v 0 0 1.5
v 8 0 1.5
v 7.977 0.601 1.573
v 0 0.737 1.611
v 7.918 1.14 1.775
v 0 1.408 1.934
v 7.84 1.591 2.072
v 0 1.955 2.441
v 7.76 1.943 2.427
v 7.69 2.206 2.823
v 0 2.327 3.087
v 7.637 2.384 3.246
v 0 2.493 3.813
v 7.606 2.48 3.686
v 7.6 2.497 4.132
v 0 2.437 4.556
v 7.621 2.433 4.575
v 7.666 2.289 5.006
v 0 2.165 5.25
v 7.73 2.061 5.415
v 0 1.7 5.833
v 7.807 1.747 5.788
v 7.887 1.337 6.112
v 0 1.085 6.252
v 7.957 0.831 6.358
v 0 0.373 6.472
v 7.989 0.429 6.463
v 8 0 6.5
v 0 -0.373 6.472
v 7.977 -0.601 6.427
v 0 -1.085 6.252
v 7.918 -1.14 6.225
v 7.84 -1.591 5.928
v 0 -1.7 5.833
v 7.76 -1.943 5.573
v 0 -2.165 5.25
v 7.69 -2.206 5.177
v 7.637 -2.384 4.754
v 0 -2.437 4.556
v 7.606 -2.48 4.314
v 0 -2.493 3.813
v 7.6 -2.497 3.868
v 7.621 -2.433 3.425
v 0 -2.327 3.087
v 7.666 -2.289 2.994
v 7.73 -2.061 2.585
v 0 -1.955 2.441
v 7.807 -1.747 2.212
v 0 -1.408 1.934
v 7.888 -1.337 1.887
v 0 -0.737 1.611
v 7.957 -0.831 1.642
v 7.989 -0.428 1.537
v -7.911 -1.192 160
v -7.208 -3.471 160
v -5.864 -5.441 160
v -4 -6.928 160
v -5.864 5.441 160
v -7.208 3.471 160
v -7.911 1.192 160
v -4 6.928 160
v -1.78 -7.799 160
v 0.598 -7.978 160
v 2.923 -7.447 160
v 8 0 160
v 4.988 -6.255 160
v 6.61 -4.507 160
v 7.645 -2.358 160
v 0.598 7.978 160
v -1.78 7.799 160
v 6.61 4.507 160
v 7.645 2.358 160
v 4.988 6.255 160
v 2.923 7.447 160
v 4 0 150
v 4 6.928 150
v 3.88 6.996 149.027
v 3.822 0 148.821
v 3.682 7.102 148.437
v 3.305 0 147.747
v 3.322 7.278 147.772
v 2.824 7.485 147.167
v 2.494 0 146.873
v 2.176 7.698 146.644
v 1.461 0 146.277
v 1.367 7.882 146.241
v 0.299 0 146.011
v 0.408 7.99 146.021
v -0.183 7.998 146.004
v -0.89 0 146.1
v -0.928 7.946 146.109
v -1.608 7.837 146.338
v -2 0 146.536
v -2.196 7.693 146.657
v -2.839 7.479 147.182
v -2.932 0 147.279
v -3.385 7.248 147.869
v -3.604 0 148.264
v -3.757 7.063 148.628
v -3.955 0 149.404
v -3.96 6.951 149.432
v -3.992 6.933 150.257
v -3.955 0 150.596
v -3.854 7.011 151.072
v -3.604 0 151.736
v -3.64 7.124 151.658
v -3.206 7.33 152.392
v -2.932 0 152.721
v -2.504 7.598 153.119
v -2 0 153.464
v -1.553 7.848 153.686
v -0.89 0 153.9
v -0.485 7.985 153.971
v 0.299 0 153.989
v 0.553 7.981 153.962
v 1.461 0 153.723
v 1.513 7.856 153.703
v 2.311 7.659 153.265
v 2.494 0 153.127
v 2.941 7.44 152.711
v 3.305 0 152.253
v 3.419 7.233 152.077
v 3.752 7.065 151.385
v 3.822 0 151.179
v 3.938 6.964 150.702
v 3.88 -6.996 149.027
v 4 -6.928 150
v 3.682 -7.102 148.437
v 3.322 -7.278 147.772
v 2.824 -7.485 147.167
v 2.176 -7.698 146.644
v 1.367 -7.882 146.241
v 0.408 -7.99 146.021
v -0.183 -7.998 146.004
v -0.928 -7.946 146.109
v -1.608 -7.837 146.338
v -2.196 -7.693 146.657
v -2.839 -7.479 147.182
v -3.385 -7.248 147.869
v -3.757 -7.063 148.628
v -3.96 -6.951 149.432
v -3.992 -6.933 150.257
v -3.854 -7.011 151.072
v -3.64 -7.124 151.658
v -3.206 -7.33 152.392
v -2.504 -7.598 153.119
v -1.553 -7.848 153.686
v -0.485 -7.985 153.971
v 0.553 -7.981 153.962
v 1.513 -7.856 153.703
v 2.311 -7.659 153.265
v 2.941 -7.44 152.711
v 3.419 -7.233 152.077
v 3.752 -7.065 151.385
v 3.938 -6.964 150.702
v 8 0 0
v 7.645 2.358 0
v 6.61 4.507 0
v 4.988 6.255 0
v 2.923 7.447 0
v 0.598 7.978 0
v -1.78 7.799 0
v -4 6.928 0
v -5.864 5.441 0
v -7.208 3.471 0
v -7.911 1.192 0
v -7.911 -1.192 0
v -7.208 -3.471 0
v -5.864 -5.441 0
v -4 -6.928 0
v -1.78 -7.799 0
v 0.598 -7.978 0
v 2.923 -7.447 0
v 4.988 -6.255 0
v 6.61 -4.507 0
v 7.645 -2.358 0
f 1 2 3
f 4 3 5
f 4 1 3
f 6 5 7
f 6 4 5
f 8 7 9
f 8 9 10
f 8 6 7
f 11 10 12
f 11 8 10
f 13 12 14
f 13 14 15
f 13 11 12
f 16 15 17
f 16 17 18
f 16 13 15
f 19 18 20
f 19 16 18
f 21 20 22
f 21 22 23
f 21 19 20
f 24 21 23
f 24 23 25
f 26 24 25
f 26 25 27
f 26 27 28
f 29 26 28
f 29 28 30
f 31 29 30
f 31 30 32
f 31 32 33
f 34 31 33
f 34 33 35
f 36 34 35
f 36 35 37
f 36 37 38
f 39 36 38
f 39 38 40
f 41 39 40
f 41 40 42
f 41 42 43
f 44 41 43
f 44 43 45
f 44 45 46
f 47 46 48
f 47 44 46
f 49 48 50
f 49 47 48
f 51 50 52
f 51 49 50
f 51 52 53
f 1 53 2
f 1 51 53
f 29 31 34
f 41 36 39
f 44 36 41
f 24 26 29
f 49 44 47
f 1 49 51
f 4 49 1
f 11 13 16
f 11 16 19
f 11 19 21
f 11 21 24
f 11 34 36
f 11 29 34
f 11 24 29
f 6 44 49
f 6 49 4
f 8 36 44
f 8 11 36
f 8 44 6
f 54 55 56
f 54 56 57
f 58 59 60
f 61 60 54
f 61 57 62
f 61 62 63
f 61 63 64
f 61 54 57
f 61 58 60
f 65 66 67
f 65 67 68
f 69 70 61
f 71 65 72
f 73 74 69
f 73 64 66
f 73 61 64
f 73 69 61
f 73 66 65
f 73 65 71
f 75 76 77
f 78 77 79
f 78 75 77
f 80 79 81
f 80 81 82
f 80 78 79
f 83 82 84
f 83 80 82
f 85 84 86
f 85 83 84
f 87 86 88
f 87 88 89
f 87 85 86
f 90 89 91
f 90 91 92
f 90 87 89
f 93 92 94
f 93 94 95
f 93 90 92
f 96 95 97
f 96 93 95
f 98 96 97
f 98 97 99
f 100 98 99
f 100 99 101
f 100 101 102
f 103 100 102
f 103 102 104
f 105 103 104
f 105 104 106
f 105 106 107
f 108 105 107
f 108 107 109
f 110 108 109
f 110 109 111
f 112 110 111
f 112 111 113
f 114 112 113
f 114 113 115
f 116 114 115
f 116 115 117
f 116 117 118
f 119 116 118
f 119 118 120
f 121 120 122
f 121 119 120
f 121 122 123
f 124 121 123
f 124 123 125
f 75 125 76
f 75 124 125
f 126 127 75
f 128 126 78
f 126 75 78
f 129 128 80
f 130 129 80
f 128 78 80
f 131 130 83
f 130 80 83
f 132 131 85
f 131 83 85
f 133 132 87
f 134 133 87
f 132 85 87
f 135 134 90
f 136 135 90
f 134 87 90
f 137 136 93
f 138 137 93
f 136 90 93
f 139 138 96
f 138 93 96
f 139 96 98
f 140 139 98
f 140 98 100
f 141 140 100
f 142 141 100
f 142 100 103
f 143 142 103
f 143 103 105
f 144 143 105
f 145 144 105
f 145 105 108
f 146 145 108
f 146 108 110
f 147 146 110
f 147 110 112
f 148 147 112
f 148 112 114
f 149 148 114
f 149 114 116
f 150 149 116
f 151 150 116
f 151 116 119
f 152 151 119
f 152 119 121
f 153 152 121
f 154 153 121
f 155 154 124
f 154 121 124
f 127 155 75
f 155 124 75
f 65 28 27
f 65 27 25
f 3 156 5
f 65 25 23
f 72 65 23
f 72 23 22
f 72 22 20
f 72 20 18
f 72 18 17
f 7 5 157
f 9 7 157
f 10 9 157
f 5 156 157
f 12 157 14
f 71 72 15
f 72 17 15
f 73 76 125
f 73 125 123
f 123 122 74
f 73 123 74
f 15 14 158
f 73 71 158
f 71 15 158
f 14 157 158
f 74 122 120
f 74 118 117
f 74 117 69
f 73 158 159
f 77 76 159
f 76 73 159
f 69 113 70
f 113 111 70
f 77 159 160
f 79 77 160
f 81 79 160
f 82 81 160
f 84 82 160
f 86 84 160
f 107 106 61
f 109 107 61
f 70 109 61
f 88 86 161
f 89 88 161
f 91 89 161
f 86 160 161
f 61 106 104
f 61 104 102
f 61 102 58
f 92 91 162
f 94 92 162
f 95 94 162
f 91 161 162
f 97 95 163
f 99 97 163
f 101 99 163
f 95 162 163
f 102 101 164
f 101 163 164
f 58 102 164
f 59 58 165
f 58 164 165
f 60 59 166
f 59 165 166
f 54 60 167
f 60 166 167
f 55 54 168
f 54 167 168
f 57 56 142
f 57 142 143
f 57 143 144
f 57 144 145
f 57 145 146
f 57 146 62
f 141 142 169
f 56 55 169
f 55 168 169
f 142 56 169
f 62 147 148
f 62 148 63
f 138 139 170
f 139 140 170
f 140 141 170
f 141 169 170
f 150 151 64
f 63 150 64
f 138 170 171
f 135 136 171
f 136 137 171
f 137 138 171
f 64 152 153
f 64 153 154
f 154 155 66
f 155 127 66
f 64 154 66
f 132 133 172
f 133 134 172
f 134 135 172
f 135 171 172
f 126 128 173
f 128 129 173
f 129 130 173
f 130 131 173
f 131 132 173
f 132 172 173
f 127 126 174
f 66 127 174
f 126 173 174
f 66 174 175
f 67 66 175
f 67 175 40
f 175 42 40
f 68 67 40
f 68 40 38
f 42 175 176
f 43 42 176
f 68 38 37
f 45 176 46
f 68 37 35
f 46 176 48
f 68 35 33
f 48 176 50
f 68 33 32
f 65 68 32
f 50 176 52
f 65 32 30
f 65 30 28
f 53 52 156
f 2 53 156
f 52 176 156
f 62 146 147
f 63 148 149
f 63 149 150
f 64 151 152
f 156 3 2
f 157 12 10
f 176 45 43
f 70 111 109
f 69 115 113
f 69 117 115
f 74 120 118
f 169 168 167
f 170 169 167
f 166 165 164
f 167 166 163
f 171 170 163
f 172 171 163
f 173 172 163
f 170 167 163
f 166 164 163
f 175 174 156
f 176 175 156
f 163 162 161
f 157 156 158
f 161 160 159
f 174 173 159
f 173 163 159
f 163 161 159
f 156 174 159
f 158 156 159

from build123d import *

# Parameters (mm, degrees)
SKETCH_1_R               = 8
EXTRUDE_1_DEPTH          = 160
CUT_EXTRUDE_1_DEPTH      = 120
CUT_EXTRUDE_1_DEPTH_BACK = 120
SKETCH_2_R               = 4
SKETCH_3_R               = 2.5
CUT_EXTRUDE_2_DEPTH      = 10


with BuildPart() as part:
    # 草图1 → 凸台-拉伸1 (new body)
    with BuildSketch(Plane.XY):
        Circle(SKETCH_1_R)
    extrude(amount=EXTRUDE_1_DEPTH)

    # 草图2 → 切除-拉伸1 (cut, two sides: drawn at the far end of the back side and taken through both)
    with BuildSketch(Plane(origin=(0, 0, 0), x_dir=(1, 0, 0), z_dir=(0, 1, 0)).offset(-CUT_EXTRUDE_1_DEPTH_BACK)):
        with Locations((0, -150)):
            Circle(SKETCH_2_R)
    extrude(amount=CUT_EXTRUDE_1_DEPTH + CUT_EXTRUDE_1_DEPTH_BACK, mode=Mode.SUBTRACT)

    # 草图3 → 切除-拉伸2 (cut)
    with BuildSketch(Plane(origin=(0, 0, 0), x_dir=(0, 0, -1), z_dir=(1, 0, 0))):
        with Locations((-4, 0)):
            Circle(SKETCH_3_R)
    extrude(amount=CUT_EXTRUDE_2_DEPTH, mode=Mode.SUBTRACT)


solid = part.part
